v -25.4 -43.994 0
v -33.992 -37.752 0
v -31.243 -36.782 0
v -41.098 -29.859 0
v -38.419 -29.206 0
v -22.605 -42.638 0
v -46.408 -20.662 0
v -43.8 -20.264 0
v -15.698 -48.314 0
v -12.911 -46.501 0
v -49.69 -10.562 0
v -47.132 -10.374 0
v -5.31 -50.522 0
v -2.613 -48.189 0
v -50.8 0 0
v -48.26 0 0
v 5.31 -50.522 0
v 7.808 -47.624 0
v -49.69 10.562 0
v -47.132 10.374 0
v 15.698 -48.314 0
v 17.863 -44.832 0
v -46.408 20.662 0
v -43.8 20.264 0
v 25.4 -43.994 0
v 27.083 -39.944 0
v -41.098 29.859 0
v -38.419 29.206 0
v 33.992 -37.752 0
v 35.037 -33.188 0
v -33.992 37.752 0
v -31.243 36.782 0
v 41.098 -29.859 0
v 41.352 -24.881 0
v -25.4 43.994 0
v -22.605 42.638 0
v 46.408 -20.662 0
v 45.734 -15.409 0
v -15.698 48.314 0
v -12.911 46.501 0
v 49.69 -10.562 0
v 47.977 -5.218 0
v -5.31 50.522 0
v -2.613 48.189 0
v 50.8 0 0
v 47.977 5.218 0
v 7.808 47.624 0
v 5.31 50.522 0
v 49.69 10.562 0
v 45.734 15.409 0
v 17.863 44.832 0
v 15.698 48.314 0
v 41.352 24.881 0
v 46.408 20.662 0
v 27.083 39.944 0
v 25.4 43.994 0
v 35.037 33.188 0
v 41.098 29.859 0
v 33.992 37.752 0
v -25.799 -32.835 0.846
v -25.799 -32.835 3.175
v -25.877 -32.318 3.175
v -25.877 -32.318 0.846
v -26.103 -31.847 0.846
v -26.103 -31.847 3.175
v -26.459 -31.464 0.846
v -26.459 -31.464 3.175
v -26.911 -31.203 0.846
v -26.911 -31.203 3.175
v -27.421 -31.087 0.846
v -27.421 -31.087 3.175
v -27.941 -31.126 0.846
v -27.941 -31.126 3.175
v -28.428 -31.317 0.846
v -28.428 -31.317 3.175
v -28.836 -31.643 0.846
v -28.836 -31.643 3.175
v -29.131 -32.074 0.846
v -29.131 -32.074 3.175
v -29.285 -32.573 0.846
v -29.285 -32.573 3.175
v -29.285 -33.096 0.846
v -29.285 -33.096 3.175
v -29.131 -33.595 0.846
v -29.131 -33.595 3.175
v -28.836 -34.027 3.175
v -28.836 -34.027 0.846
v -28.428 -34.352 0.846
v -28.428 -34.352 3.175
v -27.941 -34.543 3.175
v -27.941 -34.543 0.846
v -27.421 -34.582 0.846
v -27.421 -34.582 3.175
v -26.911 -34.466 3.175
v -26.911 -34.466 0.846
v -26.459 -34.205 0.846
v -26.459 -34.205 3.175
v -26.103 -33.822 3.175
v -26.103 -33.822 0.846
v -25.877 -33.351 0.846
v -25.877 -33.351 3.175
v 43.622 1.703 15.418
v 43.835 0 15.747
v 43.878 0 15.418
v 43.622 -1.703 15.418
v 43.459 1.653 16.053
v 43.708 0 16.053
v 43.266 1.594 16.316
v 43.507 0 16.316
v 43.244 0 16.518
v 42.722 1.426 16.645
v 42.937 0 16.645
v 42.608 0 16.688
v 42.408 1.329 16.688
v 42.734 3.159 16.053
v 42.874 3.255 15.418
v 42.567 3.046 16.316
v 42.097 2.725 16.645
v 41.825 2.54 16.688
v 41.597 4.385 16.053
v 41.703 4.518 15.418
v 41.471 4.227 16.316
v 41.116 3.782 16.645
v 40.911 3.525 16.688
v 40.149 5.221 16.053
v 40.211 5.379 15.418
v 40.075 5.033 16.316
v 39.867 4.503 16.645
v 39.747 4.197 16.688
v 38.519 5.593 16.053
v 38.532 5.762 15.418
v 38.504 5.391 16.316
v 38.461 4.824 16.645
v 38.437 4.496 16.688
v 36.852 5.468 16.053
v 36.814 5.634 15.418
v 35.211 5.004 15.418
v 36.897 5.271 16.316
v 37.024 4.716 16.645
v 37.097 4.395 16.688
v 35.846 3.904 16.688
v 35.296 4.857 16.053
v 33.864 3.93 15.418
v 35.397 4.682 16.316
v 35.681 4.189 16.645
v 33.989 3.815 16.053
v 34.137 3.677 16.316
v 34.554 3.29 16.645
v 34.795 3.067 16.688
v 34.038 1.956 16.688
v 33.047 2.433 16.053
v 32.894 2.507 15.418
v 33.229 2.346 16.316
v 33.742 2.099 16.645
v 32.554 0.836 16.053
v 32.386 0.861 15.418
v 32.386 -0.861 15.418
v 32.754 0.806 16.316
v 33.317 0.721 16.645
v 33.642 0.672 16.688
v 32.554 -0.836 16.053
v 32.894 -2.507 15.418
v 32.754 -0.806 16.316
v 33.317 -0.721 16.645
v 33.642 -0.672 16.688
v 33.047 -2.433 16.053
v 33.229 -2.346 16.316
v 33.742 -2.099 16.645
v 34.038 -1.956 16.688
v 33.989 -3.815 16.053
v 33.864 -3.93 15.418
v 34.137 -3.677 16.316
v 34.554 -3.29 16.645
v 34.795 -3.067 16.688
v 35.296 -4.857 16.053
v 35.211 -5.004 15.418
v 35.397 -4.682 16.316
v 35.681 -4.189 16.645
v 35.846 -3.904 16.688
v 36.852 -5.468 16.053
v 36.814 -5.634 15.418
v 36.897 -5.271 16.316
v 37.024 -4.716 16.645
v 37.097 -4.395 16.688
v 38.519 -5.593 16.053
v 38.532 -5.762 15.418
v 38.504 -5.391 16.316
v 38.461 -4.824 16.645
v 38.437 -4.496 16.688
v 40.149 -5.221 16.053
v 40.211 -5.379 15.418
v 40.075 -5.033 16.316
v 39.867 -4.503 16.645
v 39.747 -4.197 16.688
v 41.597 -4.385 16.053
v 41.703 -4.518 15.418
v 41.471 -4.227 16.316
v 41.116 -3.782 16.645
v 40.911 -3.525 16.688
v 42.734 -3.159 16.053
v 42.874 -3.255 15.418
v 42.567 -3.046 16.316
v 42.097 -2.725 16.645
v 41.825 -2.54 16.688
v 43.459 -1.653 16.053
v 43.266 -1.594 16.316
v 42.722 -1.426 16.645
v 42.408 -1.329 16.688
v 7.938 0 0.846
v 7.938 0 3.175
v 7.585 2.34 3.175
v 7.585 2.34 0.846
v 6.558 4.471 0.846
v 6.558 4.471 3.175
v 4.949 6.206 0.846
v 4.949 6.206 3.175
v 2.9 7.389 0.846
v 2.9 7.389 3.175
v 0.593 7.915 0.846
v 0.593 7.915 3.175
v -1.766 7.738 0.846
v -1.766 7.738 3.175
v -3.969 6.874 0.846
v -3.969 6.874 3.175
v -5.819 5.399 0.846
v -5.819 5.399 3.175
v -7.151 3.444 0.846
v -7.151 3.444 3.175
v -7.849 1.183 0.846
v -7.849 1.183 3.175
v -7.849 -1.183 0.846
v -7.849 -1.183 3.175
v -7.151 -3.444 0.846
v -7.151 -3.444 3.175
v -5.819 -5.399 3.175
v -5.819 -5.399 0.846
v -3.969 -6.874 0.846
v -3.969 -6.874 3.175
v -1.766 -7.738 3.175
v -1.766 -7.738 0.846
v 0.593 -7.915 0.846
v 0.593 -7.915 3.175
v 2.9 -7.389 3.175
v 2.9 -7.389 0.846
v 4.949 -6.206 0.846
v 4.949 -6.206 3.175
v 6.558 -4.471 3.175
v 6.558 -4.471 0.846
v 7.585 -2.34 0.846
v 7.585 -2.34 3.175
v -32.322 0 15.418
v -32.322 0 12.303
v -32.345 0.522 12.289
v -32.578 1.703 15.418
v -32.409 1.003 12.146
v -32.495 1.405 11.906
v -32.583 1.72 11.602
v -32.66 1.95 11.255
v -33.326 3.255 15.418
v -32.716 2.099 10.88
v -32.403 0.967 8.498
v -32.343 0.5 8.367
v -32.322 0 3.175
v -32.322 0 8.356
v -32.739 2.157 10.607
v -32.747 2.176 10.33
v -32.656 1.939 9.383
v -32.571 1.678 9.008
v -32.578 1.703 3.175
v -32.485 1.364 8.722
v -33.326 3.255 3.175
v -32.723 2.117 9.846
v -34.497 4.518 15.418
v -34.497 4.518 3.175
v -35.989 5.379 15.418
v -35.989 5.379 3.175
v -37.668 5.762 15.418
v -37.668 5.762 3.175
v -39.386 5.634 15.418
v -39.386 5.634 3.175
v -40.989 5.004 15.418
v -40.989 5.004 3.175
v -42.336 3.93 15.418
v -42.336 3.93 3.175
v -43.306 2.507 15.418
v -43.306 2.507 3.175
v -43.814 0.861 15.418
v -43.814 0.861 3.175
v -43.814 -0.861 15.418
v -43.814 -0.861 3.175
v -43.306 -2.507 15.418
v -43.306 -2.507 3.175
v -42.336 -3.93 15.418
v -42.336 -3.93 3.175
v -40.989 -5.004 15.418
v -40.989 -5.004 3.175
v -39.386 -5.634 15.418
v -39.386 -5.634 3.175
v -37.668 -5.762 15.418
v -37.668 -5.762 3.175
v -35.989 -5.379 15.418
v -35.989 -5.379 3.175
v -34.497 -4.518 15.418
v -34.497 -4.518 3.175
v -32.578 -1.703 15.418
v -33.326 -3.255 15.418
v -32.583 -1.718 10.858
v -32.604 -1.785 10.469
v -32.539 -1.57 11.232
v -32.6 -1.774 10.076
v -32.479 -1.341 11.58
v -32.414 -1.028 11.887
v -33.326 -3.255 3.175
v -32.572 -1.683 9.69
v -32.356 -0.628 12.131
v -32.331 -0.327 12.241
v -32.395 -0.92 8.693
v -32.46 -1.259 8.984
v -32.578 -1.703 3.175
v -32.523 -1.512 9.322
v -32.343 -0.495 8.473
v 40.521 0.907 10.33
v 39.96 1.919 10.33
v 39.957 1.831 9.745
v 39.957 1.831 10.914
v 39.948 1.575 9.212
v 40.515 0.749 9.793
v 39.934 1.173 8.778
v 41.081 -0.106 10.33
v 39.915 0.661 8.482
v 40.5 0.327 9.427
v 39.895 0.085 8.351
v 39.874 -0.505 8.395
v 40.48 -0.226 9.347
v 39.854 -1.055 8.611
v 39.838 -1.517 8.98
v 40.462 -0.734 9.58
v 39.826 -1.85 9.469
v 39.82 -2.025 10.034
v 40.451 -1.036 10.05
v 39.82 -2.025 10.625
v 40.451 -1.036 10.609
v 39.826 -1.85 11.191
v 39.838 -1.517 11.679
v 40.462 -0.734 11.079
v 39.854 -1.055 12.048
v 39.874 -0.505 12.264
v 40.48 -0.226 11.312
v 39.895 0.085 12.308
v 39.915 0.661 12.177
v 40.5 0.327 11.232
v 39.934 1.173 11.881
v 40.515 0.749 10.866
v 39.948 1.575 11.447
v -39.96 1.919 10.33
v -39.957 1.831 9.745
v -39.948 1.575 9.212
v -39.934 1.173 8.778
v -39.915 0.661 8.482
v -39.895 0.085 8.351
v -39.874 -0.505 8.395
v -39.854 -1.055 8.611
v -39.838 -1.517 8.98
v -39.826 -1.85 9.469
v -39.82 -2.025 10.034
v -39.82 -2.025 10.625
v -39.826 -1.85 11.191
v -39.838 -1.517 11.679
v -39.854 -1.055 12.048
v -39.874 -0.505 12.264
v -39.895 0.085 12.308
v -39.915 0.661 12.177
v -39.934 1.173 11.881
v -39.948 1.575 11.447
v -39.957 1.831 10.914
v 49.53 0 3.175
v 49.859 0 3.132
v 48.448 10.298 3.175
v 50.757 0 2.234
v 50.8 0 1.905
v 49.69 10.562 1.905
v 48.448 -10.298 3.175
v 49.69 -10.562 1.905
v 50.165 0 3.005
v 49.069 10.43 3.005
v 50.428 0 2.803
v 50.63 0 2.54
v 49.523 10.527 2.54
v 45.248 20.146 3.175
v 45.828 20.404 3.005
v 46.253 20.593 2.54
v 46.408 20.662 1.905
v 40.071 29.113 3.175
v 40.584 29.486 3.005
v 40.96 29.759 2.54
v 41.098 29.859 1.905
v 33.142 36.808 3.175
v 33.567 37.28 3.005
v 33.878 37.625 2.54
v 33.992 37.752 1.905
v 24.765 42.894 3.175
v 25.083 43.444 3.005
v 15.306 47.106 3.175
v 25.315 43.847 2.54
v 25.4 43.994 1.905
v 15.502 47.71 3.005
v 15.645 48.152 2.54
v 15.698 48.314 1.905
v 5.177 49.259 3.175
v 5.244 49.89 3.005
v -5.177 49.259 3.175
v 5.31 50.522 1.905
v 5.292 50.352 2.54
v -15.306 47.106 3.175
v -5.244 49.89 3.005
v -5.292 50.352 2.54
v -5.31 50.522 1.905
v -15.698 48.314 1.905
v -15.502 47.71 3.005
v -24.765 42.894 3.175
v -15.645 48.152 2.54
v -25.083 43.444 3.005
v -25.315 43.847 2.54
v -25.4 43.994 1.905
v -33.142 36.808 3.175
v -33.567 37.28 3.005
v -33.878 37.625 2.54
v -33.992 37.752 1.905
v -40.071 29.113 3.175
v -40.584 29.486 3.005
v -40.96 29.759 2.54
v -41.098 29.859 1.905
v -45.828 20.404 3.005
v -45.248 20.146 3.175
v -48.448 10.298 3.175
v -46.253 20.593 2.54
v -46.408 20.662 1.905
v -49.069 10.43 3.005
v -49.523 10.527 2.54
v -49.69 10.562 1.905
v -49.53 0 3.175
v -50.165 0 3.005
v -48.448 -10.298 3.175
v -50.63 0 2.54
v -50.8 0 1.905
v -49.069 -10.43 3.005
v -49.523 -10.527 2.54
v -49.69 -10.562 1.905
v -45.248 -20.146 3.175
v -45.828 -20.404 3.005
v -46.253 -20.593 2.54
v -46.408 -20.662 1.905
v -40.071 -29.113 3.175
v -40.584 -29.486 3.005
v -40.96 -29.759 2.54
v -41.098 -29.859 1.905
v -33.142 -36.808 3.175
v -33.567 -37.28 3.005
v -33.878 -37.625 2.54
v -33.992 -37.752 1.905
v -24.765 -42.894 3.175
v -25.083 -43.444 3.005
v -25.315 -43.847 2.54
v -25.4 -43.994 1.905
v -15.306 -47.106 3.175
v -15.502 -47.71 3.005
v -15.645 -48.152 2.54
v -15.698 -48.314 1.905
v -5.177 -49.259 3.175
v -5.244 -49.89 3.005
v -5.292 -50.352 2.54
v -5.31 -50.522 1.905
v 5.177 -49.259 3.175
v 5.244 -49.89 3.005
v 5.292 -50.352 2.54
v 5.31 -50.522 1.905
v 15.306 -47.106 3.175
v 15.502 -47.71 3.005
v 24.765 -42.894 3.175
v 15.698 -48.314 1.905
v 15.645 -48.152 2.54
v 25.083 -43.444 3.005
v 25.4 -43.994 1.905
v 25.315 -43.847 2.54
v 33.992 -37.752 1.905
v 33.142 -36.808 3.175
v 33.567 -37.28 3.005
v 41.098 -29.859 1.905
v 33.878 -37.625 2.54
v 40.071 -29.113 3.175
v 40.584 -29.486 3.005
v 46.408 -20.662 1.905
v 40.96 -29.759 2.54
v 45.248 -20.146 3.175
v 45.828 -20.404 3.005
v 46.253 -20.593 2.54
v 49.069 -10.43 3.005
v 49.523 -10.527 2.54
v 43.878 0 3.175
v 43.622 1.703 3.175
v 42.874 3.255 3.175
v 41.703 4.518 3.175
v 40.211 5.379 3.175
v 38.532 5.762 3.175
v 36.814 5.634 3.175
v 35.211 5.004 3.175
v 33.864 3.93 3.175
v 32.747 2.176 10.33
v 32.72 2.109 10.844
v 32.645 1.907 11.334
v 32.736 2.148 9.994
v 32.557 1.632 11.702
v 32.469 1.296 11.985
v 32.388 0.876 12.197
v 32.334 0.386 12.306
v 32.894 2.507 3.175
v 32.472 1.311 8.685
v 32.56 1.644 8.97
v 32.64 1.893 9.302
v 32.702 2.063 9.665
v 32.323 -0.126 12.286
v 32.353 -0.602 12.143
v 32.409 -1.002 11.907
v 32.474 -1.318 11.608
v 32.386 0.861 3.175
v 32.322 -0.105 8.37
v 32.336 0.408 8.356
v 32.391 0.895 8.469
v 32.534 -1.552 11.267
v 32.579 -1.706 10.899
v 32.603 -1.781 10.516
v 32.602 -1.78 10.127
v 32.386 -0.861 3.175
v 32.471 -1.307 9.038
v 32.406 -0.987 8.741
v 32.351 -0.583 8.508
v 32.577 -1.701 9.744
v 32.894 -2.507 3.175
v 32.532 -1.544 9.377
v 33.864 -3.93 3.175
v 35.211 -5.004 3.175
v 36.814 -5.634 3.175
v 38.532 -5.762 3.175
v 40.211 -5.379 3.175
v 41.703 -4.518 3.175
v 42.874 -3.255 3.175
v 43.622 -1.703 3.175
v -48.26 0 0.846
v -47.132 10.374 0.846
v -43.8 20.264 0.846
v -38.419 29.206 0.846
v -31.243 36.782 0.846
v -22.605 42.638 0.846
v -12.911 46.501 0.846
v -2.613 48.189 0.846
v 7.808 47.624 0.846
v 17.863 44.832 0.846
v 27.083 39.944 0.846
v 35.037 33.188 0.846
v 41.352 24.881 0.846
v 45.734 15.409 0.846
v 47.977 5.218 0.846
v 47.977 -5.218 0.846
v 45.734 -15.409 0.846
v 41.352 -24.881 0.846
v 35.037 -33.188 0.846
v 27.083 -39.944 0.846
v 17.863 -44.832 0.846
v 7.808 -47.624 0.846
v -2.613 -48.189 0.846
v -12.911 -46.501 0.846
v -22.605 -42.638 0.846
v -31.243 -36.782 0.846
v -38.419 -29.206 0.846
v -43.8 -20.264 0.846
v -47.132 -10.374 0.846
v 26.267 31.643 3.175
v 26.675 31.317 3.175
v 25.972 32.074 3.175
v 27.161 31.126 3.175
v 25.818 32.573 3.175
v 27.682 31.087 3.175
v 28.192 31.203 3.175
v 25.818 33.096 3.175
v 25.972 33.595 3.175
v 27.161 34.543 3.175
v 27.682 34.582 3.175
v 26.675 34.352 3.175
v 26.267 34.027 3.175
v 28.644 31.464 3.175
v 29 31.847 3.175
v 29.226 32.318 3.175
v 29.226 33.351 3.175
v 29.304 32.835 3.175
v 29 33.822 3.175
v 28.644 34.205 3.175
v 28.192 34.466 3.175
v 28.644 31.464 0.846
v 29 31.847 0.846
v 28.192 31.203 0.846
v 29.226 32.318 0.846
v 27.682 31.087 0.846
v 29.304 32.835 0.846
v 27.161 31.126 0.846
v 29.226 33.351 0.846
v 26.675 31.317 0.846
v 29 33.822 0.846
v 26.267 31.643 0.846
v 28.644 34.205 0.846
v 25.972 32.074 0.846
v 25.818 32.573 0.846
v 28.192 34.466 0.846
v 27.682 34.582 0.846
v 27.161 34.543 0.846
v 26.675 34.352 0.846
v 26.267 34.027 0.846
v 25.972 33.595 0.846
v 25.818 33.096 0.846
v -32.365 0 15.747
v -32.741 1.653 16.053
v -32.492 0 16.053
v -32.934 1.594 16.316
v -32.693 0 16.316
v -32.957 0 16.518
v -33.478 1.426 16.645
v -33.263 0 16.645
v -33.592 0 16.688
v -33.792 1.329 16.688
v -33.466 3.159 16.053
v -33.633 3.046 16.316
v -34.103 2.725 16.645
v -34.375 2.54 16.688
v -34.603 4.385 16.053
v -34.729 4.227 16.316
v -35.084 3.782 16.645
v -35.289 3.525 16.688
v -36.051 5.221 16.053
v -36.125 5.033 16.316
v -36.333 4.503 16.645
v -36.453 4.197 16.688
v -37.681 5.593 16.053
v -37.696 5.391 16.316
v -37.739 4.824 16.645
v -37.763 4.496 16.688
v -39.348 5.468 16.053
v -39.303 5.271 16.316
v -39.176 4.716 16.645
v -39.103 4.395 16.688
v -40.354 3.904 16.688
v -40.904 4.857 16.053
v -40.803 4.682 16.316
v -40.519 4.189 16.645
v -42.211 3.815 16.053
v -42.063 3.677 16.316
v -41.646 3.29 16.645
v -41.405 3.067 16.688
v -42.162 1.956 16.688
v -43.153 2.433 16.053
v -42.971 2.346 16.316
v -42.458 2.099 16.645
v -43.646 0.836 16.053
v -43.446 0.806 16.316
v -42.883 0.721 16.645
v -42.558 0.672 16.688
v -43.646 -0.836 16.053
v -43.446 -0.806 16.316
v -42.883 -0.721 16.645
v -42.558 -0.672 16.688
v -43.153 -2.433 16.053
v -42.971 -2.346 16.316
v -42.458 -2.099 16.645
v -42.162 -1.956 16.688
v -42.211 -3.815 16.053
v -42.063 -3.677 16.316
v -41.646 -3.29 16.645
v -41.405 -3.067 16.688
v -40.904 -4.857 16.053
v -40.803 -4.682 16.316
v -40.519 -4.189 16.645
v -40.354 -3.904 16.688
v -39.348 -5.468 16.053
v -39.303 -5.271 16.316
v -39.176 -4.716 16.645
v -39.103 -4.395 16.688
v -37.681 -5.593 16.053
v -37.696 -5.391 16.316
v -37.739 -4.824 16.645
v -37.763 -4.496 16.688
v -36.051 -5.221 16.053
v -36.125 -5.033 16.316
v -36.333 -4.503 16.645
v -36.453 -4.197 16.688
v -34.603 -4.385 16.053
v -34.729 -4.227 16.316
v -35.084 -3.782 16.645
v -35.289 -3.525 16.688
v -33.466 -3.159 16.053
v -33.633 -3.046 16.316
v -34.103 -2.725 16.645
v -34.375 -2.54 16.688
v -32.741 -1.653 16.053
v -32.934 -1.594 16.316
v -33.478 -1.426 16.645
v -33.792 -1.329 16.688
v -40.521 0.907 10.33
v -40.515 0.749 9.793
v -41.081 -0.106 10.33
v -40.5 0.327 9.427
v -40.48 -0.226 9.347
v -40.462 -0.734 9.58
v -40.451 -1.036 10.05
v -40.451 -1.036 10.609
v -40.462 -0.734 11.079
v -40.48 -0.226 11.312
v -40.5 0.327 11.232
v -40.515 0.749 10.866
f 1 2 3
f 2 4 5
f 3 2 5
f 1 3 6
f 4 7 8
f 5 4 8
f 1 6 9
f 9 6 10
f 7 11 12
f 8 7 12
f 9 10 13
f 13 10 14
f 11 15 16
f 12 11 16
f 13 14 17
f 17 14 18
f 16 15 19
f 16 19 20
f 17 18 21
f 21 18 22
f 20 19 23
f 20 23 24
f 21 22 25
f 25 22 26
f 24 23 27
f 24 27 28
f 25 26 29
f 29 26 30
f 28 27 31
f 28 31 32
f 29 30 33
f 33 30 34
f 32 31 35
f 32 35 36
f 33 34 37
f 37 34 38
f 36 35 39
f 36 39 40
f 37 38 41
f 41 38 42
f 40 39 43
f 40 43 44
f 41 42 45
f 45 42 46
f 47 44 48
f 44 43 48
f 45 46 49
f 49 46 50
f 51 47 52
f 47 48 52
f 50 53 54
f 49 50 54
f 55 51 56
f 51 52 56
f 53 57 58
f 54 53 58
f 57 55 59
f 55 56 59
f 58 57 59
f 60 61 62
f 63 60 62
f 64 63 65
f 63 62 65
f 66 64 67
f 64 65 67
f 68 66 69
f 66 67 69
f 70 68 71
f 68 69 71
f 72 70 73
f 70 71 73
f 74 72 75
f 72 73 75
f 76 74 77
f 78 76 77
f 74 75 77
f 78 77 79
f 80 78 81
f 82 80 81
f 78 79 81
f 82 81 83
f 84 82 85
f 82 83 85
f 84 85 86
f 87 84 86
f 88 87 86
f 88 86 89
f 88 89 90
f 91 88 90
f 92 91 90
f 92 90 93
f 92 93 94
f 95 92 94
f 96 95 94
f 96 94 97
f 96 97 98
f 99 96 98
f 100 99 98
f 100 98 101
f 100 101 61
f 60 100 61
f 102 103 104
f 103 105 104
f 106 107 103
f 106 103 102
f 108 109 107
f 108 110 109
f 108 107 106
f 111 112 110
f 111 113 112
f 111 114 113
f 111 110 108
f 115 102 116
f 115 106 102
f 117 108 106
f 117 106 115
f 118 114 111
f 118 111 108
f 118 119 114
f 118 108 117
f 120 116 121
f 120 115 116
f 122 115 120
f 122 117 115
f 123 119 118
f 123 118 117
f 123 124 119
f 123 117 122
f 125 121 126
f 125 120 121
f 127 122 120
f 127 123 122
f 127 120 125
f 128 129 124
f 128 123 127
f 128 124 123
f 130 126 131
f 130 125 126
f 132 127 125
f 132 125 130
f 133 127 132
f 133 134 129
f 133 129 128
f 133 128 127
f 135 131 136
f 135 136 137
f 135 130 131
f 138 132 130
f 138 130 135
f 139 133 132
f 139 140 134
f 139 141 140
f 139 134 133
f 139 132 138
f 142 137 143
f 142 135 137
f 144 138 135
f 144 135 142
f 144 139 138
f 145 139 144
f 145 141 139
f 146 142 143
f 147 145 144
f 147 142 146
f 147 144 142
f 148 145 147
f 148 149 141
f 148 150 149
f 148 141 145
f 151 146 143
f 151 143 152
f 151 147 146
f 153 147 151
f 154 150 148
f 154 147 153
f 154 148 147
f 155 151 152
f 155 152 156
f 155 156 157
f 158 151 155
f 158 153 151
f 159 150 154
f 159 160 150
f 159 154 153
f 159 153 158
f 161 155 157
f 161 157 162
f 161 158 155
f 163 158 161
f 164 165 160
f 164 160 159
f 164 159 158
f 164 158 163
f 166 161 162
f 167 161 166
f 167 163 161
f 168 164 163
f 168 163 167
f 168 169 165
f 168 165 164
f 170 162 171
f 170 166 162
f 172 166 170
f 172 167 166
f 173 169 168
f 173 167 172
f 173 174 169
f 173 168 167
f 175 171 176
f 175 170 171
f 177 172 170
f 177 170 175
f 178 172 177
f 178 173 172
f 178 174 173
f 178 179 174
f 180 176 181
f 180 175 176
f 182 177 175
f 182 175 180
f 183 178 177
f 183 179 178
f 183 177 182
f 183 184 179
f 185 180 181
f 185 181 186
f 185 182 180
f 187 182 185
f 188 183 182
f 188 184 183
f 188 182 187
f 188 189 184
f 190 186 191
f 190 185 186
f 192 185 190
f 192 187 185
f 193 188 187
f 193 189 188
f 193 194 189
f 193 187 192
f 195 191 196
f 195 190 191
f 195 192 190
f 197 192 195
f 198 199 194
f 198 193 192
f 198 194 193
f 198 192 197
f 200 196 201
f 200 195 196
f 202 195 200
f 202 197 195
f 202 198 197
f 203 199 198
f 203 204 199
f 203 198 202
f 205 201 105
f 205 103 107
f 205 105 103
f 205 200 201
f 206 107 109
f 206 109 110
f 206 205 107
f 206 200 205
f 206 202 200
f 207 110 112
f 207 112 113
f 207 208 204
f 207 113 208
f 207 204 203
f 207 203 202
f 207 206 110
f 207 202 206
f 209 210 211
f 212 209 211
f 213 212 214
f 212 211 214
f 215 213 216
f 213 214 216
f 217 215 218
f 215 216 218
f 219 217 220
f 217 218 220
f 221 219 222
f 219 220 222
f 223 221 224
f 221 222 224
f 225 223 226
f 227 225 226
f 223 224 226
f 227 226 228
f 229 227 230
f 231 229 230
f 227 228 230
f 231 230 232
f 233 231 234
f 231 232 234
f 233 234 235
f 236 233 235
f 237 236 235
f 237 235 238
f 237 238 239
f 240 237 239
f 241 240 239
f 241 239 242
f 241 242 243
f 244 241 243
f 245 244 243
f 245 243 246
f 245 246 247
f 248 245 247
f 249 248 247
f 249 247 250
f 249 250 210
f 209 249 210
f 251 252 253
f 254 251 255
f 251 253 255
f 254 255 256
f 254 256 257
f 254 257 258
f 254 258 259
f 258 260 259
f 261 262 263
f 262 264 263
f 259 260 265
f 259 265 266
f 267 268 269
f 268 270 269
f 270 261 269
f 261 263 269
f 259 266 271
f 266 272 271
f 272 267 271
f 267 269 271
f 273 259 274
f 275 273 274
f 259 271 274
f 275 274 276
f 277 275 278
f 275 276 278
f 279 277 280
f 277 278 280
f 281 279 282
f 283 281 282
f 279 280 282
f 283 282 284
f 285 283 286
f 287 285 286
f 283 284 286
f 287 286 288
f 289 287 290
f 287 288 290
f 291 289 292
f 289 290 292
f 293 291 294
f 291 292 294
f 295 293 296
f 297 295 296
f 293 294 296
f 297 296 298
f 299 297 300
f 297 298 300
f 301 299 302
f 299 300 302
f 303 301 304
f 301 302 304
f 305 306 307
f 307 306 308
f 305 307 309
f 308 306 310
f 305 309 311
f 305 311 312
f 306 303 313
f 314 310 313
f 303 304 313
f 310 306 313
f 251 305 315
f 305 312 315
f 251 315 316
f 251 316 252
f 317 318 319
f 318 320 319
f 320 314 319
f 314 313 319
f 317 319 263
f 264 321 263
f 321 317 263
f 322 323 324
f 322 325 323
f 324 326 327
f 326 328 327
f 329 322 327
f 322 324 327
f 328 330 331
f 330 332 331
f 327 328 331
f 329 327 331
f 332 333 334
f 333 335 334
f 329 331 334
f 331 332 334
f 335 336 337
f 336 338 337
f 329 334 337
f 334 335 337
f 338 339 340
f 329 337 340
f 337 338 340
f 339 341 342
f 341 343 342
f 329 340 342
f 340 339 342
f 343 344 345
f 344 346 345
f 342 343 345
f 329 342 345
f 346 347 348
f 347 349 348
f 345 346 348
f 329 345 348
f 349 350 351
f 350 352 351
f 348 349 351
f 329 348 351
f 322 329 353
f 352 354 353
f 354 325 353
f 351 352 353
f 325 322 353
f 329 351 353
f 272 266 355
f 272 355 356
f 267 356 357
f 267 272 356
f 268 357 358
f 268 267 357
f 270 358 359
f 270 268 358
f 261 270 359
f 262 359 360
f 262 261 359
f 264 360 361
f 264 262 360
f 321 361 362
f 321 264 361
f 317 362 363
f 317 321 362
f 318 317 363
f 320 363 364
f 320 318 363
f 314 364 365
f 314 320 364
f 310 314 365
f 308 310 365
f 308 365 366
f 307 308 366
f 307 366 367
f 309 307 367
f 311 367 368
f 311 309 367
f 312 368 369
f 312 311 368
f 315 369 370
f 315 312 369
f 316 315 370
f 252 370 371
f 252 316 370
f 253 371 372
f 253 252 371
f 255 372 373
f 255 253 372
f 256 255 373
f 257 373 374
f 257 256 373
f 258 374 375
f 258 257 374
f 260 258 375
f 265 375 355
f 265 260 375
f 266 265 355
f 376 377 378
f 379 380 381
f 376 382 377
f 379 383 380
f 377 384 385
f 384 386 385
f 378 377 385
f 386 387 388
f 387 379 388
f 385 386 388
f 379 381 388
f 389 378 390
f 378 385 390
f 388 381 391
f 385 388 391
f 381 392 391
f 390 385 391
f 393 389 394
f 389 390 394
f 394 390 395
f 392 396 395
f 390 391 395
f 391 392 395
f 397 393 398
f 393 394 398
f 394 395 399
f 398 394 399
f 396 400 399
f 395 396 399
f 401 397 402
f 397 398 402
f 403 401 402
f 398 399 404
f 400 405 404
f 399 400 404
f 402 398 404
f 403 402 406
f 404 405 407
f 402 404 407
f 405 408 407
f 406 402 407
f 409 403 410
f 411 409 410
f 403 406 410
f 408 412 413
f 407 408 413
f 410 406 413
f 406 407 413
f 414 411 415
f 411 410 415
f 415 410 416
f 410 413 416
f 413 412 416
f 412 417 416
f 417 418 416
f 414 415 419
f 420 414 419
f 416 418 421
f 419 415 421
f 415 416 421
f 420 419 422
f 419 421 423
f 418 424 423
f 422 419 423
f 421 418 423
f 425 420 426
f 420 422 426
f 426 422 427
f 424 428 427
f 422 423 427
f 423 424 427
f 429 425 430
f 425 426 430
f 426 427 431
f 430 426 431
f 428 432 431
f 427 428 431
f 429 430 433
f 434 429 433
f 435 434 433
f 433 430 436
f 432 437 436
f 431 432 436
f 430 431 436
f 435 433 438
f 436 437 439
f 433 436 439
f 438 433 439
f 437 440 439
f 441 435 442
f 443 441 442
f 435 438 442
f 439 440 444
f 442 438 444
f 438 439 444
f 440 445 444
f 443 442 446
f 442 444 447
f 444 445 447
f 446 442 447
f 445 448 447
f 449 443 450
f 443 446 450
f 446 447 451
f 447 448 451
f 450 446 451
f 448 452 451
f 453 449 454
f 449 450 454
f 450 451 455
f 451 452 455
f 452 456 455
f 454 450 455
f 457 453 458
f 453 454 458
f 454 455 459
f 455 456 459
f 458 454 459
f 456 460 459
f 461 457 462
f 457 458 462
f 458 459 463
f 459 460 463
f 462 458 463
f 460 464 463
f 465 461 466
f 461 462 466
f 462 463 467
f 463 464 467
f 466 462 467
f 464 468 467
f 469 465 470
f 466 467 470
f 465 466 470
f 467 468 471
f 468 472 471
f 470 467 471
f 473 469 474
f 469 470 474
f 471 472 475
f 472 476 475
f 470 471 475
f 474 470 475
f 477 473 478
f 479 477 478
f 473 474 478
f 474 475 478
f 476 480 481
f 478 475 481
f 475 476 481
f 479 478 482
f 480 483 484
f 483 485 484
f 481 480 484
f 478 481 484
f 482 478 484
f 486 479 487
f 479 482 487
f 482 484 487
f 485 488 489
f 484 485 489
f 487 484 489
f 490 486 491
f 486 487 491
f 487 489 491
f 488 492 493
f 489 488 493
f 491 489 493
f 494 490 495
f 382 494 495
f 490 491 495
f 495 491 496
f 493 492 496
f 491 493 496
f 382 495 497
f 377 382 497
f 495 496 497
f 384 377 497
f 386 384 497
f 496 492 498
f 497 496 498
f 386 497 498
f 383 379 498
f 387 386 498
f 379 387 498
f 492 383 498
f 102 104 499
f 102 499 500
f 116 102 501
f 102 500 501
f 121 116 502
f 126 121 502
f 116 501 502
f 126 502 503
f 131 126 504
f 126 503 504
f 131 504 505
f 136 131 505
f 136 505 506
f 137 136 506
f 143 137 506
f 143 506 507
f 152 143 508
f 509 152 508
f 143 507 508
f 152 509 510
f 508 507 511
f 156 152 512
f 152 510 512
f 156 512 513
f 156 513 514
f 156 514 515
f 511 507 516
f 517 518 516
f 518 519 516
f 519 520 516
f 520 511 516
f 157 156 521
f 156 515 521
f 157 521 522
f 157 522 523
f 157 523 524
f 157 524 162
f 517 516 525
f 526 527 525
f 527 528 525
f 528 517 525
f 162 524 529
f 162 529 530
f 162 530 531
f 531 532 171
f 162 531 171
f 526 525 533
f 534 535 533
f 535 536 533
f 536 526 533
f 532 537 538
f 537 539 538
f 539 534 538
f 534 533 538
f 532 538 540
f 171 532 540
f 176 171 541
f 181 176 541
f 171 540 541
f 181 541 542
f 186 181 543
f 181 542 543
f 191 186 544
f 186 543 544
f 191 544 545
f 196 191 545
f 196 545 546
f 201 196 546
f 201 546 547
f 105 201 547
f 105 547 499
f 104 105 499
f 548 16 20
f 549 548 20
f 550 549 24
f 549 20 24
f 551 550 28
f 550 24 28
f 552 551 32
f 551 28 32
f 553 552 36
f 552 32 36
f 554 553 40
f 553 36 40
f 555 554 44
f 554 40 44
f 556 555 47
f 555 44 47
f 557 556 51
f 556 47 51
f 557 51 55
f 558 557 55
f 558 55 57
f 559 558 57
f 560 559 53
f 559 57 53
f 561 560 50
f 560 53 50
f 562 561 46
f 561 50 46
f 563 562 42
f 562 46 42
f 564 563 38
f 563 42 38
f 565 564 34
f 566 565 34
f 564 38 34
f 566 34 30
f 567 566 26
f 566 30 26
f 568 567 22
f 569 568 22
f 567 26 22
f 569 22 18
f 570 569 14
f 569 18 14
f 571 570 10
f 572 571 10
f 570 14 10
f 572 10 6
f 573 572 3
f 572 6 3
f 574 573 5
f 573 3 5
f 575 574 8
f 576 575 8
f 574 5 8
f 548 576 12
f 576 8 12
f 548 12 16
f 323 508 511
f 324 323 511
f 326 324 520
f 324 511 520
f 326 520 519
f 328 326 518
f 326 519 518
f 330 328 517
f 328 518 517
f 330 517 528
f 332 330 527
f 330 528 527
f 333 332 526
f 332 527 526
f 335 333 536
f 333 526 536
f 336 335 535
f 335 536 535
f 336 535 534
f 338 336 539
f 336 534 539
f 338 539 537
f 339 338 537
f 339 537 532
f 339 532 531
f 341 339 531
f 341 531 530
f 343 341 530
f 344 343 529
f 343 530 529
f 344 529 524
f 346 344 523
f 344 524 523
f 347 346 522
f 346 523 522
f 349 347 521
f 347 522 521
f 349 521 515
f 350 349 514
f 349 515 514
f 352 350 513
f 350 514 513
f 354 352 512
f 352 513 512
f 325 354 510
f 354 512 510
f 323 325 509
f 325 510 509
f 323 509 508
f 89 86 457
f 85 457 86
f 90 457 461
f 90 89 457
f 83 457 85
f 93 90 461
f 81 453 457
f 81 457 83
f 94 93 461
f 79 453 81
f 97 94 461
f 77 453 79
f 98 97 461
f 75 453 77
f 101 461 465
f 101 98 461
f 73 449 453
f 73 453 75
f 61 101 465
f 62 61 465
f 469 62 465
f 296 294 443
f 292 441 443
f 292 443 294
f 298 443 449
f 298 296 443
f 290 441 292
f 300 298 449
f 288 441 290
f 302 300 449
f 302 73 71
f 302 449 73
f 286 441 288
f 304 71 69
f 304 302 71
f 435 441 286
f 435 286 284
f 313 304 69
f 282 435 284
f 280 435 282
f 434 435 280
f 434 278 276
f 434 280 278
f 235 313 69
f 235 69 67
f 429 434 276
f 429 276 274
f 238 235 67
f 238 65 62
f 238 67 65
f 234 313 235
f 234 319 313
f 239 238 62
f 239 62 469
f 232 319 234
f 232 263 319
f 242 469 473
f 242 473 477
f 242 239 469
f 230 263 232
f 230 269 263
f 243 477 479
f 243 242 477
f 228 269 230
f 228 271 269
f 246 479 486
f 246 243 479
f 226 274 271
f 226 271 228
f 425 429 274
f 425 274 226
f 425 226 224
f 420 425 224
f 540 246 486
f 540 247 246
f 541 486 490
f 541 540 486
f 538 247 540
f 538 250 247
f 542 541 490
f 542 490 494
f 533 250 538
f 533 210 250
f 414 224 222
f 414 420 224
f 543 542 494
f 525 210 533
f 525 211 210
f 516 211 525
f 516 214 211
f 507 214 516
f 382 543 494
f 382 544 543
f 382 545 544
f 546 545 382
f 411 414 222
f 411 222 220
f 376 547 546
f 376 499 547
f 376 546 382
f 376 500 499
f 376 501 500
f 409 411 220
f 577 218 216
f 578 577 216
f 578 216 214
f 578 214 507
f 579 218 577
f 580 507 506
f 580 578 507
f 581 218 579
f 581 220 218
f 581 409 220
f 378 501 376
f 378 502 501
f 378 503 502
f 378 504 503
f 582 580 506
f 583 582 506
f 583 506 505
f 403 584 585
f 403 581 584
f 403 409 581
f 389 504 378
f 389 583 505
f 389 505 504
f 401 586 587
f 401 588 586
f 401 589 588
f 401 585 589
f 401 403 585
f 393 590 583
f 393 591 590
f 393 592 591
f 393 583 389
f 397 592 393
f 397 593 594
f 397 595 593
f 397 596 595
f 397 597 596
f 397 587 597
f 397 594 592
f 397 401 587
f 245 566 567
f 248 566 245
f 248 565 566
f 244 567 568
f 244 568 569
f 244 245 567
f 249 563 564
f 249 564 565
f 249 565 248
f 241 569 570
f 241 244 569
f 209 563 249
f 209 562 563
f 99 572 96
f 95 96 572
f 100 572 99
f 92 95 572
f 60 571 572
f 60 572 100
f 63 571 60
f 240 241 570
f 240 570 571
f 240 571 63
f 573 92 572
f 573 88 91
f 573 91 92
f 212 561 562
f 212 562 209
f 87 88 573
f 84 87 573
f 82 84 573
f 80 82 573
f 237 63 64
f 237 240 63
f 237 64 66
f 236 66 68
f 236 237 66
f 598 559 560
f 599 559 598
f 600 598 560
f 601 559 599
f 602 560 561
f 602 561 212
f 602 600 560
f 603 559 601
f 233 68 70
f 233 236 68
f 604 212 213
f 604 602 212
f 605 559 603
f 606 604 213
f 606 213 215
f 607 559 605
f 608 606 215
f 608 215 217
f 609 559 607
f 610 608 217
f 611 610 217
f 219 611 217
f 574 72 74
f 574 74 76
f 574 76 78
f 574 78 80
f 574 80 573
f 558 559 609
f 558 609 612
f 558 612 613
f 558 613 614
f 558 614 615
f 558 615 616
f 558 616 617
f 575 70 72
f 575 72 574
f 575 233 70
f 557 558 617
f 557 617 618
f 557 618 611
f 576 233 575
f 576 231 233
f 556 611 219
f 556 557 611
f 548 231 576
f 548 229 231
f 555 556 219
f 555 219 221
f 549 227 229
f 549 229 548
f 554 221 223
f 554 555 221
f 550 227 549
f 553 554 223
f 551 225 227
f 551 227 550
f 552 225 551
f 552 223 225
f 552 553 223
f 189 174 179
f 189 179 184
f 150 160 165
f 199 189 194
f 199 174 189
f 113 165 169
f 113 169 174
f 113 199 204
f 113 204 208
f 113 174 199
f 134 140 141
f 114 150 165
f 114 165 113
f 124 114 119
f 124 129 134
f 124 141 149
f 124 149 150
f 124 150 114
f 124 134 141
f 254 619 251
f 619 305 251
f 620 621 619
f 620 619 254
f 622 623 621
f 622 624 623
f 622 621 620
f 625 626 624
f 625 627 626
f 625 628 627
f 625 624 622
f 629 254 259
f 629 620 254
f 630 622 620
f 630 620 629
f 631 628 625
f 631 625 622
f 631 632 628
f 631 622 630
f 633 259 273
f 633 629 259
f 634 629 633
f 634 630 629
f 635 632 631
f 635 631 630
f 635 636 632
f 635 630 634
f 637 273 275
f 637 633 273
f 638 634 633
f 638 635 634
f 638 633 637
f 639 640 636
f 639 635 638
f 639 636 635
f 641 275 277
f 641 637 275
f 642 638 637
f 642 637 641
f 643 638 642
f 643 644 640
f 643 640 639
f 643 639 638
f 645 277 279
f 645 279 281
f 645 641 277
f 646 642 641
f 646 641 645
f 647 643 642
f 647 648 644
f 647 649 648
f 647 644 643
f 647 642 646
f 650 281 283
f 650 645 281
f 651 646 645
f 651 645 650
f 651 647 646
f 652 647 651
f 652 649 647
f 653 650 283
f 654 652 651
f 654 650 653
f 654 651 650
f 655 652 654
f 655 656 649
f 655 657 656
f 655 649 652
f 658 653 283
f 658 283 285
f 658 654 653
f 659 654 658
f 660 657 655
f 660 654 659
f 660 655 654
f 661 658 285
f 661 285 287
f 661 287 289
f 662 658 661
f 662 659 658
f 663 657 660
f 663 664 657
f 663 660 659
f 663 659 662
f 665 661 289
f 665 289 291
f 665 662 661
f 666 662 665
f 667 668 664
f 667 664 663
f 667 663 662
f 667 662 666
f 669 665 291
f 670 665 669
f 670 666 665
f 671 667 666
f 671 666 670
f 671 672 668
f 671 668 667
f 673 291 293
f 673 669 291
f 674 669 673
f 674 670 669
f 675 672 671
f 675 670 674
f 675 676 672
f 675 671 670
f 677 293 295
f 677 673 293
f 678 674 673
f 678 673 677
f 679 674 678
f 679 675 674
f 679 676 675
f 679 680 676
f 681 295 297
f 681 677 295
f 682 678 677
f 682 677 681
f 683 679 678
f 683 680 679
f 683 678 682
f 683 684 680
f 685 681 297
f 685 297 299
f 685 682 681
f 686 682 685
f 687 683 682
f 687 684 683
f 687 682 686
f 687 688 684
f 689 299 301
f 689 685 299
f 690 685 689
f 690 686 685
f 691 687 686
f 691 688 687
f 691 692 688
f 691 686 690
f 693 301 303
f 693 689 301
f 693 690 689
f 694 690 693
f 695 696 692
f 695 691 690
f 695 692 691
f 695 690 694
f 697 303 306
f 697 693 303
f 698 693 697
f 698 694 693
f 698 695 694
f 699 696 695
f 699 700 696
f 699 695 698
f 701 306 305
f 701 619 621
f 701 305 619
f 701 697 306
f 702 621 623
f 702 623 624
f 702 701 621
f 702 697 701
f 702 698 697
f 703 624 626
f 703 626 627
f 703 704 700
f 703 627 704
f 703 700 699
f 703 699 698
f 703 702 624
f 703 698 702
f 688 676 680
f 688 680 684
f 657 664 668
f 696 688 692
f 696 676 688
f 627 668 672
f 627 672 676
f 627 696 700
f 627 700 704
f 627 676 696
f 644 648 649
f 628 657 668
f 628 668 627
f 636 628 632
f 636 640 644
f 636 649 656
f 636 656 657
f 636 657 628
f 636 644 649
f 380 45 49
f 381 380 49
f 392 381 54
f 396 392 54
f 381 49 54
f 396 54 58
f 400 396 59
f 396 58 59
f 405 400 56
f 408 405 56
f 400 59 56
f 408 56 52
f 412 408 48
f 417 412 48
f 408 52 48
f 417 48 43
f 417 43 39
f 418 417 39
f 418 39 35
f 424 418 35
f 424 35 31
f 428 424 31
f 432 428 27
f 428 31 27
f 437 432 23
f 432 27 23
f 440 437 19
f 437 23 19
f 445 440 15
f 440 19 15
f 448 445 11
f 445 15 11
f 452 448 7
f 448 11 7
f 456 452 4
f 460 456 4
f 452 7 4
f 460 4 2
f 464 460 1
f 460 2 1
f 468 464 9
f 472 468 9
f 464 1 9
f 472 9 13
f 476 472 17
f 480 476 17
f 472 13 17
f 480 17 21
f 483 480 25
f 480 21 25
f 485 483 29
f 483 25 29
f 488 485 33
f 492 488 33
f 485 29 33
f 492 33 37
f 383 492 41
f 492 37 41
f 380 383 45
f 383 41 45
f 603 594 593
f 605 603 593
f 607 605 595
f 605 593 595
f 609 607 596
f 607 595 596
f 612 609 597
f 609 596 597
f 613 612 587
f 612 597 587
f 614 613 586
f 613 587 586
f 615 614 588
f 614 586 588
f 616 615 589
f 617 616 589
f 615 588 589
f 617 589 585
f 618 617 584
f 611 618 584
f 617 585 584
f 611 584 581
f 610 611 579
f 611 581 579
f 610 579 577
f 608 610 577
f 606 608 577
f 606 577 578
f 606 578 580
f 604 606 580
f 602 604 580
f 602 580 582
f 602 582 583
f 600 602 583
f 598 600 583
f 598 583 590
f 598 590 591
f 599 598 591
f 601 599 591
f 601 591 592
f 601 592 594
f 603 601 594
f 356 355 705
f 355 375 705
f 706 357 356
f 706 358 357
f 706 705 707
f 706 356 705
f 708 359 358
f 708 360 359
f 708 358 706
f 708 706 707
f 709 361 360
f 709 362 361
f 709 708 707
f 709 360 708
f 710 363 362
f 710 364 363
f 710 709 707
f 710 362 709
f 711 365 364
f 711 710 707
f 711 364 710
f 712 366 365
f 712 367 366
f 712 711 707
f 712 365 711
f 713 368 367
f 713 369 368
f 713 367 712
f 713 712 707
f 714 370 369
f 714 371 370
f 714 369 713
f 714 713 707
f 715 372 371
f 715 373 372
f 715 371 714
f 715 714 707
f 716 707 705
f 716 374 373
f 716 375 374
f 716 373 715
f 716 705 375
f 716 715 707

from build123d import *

# Parameters (mm, degrees)
SKETCH1_R           = 50.8
BOSS_EXTRUDE1_DEPTH = 3.175
SKETCH2_R           = 48.26
CUT_EXTRUDE1_DEPTH  = 0.84582
SKETCH3_R           = 7.9375
CUT_EXTRUDE2_DEPTH  = 21.1328
SKETCH4_R           = 1.7526
CUT_EXTRUDE3_DEPTH  = 72.912172996
SKETCH5_R           = 5.7785
BOSS_EXTRUDE2_DEPTH = 13.5128
FILLET1_R           = 1.27
FILLET2_R           = 1.27


with BuildPart() as part:
    # Sketch1 → Boss-Extrude1 (new body)
    with BuildSketch(Plane.XY):
        Circle(SKETCH1_R)
    extrude(amount=BOSS_EXTRUDE1_DEPTH)

    # Sketch2 → Cut-Extrude1 (cut)
    with BuildSketch(Plane(origin=(0, 0, 0), x_dir=(-1, 0, 0), z_dir=(0, 0, -1))):
        Circle(SKETCH2_R)
    extrude(amount=-CUT_EXTRUDE1_DEPTH, mode=Mode.SUBTRACT)

    # Sketch3 → Cut-Extrude2 (cut)
    with BuildSketch(Plane.XY.offset(3.175)):
        Circle(SKETCH3_R)
    extrude(amount=-CUT_EXTRUDE2_DEPTH, mode=Mode.SUBTRACT)

    # Sketch4 → Cut-Extrude3 (cut, through all)
    with BuildSketch(Plane.XY.offset(3.175)):
        with Locations((27.55148392, 32.834579943)):
            Circle(SKETCH4_R)
        with Locations((-27.55148392, -32.834579943)):
            Circle(SKETCH4_R)
    extrude(amount=-CUT_EXTRUDE3_DEPTH, mode=Mode.SUBTRACT)

    # Sketch5 → Boss-Extrude2 (add)
    with BuildSketch(Plane.XY.offset(3.175)):
        with Locations((-38.1, 0)):
            Circle(SKETCH5_R)
        with Locations((38.1, 0)):
            Circle(SKETCH5_R)
    extrude(amount=BOSS_EXTRUDE2_DEPTH)

    # Sketch8 → 5/32 (0.15625) Diameter Hole1 (revolve, cut)
    with BuildSketch(Plane(origin=(-32.325156325, 0.205530485, 10.329557964), x_dir=(-0.03556813784183403, 0.9993672536012296, 0), z_dir=(0, 0, 1))):
        Polygon((0, 0), (0, 8.761532791), (1.984375, 7.5692), (1.984375, 0), align=None)
    f_5_32_0_15625_diameter_hole1 = revolve(axis=Axis((-25.979174265, 0.43138816, 10.329557964), (-0.9993672536012297, -0.03556813784183403, 0)), mode=Mode.SUBTRACT)

    # Mirror1: 5/32 (0.15625) Diameter Hole1 across plane
    add(f_5_32_0_15625_diameter_hole1.mirror(Plane(origin=(0, 0, 0), x_dir=(0, 0, 1), z_dir=(1, 0, 0))), mode=Mode.SUBTRACT)

    # Fillet1
    fillet1_edges = [part.edges().sort_by_distance(p)[0] for p in [
        (-43.8785, 0, 16.6878),
        (32.3215, 0, 16.6878),
    ]]
    fillet(fillet1_edges, radius=FILLET1_R)

    # Fillet2
    fillet2_edges = [part.edges().sort_by_distance(p)[0] for p in [
        (-50.8, 0, 3.175),
    ]]
    fillet(fillet2_edges, radius=FILLET2_R)


solid = part.part
